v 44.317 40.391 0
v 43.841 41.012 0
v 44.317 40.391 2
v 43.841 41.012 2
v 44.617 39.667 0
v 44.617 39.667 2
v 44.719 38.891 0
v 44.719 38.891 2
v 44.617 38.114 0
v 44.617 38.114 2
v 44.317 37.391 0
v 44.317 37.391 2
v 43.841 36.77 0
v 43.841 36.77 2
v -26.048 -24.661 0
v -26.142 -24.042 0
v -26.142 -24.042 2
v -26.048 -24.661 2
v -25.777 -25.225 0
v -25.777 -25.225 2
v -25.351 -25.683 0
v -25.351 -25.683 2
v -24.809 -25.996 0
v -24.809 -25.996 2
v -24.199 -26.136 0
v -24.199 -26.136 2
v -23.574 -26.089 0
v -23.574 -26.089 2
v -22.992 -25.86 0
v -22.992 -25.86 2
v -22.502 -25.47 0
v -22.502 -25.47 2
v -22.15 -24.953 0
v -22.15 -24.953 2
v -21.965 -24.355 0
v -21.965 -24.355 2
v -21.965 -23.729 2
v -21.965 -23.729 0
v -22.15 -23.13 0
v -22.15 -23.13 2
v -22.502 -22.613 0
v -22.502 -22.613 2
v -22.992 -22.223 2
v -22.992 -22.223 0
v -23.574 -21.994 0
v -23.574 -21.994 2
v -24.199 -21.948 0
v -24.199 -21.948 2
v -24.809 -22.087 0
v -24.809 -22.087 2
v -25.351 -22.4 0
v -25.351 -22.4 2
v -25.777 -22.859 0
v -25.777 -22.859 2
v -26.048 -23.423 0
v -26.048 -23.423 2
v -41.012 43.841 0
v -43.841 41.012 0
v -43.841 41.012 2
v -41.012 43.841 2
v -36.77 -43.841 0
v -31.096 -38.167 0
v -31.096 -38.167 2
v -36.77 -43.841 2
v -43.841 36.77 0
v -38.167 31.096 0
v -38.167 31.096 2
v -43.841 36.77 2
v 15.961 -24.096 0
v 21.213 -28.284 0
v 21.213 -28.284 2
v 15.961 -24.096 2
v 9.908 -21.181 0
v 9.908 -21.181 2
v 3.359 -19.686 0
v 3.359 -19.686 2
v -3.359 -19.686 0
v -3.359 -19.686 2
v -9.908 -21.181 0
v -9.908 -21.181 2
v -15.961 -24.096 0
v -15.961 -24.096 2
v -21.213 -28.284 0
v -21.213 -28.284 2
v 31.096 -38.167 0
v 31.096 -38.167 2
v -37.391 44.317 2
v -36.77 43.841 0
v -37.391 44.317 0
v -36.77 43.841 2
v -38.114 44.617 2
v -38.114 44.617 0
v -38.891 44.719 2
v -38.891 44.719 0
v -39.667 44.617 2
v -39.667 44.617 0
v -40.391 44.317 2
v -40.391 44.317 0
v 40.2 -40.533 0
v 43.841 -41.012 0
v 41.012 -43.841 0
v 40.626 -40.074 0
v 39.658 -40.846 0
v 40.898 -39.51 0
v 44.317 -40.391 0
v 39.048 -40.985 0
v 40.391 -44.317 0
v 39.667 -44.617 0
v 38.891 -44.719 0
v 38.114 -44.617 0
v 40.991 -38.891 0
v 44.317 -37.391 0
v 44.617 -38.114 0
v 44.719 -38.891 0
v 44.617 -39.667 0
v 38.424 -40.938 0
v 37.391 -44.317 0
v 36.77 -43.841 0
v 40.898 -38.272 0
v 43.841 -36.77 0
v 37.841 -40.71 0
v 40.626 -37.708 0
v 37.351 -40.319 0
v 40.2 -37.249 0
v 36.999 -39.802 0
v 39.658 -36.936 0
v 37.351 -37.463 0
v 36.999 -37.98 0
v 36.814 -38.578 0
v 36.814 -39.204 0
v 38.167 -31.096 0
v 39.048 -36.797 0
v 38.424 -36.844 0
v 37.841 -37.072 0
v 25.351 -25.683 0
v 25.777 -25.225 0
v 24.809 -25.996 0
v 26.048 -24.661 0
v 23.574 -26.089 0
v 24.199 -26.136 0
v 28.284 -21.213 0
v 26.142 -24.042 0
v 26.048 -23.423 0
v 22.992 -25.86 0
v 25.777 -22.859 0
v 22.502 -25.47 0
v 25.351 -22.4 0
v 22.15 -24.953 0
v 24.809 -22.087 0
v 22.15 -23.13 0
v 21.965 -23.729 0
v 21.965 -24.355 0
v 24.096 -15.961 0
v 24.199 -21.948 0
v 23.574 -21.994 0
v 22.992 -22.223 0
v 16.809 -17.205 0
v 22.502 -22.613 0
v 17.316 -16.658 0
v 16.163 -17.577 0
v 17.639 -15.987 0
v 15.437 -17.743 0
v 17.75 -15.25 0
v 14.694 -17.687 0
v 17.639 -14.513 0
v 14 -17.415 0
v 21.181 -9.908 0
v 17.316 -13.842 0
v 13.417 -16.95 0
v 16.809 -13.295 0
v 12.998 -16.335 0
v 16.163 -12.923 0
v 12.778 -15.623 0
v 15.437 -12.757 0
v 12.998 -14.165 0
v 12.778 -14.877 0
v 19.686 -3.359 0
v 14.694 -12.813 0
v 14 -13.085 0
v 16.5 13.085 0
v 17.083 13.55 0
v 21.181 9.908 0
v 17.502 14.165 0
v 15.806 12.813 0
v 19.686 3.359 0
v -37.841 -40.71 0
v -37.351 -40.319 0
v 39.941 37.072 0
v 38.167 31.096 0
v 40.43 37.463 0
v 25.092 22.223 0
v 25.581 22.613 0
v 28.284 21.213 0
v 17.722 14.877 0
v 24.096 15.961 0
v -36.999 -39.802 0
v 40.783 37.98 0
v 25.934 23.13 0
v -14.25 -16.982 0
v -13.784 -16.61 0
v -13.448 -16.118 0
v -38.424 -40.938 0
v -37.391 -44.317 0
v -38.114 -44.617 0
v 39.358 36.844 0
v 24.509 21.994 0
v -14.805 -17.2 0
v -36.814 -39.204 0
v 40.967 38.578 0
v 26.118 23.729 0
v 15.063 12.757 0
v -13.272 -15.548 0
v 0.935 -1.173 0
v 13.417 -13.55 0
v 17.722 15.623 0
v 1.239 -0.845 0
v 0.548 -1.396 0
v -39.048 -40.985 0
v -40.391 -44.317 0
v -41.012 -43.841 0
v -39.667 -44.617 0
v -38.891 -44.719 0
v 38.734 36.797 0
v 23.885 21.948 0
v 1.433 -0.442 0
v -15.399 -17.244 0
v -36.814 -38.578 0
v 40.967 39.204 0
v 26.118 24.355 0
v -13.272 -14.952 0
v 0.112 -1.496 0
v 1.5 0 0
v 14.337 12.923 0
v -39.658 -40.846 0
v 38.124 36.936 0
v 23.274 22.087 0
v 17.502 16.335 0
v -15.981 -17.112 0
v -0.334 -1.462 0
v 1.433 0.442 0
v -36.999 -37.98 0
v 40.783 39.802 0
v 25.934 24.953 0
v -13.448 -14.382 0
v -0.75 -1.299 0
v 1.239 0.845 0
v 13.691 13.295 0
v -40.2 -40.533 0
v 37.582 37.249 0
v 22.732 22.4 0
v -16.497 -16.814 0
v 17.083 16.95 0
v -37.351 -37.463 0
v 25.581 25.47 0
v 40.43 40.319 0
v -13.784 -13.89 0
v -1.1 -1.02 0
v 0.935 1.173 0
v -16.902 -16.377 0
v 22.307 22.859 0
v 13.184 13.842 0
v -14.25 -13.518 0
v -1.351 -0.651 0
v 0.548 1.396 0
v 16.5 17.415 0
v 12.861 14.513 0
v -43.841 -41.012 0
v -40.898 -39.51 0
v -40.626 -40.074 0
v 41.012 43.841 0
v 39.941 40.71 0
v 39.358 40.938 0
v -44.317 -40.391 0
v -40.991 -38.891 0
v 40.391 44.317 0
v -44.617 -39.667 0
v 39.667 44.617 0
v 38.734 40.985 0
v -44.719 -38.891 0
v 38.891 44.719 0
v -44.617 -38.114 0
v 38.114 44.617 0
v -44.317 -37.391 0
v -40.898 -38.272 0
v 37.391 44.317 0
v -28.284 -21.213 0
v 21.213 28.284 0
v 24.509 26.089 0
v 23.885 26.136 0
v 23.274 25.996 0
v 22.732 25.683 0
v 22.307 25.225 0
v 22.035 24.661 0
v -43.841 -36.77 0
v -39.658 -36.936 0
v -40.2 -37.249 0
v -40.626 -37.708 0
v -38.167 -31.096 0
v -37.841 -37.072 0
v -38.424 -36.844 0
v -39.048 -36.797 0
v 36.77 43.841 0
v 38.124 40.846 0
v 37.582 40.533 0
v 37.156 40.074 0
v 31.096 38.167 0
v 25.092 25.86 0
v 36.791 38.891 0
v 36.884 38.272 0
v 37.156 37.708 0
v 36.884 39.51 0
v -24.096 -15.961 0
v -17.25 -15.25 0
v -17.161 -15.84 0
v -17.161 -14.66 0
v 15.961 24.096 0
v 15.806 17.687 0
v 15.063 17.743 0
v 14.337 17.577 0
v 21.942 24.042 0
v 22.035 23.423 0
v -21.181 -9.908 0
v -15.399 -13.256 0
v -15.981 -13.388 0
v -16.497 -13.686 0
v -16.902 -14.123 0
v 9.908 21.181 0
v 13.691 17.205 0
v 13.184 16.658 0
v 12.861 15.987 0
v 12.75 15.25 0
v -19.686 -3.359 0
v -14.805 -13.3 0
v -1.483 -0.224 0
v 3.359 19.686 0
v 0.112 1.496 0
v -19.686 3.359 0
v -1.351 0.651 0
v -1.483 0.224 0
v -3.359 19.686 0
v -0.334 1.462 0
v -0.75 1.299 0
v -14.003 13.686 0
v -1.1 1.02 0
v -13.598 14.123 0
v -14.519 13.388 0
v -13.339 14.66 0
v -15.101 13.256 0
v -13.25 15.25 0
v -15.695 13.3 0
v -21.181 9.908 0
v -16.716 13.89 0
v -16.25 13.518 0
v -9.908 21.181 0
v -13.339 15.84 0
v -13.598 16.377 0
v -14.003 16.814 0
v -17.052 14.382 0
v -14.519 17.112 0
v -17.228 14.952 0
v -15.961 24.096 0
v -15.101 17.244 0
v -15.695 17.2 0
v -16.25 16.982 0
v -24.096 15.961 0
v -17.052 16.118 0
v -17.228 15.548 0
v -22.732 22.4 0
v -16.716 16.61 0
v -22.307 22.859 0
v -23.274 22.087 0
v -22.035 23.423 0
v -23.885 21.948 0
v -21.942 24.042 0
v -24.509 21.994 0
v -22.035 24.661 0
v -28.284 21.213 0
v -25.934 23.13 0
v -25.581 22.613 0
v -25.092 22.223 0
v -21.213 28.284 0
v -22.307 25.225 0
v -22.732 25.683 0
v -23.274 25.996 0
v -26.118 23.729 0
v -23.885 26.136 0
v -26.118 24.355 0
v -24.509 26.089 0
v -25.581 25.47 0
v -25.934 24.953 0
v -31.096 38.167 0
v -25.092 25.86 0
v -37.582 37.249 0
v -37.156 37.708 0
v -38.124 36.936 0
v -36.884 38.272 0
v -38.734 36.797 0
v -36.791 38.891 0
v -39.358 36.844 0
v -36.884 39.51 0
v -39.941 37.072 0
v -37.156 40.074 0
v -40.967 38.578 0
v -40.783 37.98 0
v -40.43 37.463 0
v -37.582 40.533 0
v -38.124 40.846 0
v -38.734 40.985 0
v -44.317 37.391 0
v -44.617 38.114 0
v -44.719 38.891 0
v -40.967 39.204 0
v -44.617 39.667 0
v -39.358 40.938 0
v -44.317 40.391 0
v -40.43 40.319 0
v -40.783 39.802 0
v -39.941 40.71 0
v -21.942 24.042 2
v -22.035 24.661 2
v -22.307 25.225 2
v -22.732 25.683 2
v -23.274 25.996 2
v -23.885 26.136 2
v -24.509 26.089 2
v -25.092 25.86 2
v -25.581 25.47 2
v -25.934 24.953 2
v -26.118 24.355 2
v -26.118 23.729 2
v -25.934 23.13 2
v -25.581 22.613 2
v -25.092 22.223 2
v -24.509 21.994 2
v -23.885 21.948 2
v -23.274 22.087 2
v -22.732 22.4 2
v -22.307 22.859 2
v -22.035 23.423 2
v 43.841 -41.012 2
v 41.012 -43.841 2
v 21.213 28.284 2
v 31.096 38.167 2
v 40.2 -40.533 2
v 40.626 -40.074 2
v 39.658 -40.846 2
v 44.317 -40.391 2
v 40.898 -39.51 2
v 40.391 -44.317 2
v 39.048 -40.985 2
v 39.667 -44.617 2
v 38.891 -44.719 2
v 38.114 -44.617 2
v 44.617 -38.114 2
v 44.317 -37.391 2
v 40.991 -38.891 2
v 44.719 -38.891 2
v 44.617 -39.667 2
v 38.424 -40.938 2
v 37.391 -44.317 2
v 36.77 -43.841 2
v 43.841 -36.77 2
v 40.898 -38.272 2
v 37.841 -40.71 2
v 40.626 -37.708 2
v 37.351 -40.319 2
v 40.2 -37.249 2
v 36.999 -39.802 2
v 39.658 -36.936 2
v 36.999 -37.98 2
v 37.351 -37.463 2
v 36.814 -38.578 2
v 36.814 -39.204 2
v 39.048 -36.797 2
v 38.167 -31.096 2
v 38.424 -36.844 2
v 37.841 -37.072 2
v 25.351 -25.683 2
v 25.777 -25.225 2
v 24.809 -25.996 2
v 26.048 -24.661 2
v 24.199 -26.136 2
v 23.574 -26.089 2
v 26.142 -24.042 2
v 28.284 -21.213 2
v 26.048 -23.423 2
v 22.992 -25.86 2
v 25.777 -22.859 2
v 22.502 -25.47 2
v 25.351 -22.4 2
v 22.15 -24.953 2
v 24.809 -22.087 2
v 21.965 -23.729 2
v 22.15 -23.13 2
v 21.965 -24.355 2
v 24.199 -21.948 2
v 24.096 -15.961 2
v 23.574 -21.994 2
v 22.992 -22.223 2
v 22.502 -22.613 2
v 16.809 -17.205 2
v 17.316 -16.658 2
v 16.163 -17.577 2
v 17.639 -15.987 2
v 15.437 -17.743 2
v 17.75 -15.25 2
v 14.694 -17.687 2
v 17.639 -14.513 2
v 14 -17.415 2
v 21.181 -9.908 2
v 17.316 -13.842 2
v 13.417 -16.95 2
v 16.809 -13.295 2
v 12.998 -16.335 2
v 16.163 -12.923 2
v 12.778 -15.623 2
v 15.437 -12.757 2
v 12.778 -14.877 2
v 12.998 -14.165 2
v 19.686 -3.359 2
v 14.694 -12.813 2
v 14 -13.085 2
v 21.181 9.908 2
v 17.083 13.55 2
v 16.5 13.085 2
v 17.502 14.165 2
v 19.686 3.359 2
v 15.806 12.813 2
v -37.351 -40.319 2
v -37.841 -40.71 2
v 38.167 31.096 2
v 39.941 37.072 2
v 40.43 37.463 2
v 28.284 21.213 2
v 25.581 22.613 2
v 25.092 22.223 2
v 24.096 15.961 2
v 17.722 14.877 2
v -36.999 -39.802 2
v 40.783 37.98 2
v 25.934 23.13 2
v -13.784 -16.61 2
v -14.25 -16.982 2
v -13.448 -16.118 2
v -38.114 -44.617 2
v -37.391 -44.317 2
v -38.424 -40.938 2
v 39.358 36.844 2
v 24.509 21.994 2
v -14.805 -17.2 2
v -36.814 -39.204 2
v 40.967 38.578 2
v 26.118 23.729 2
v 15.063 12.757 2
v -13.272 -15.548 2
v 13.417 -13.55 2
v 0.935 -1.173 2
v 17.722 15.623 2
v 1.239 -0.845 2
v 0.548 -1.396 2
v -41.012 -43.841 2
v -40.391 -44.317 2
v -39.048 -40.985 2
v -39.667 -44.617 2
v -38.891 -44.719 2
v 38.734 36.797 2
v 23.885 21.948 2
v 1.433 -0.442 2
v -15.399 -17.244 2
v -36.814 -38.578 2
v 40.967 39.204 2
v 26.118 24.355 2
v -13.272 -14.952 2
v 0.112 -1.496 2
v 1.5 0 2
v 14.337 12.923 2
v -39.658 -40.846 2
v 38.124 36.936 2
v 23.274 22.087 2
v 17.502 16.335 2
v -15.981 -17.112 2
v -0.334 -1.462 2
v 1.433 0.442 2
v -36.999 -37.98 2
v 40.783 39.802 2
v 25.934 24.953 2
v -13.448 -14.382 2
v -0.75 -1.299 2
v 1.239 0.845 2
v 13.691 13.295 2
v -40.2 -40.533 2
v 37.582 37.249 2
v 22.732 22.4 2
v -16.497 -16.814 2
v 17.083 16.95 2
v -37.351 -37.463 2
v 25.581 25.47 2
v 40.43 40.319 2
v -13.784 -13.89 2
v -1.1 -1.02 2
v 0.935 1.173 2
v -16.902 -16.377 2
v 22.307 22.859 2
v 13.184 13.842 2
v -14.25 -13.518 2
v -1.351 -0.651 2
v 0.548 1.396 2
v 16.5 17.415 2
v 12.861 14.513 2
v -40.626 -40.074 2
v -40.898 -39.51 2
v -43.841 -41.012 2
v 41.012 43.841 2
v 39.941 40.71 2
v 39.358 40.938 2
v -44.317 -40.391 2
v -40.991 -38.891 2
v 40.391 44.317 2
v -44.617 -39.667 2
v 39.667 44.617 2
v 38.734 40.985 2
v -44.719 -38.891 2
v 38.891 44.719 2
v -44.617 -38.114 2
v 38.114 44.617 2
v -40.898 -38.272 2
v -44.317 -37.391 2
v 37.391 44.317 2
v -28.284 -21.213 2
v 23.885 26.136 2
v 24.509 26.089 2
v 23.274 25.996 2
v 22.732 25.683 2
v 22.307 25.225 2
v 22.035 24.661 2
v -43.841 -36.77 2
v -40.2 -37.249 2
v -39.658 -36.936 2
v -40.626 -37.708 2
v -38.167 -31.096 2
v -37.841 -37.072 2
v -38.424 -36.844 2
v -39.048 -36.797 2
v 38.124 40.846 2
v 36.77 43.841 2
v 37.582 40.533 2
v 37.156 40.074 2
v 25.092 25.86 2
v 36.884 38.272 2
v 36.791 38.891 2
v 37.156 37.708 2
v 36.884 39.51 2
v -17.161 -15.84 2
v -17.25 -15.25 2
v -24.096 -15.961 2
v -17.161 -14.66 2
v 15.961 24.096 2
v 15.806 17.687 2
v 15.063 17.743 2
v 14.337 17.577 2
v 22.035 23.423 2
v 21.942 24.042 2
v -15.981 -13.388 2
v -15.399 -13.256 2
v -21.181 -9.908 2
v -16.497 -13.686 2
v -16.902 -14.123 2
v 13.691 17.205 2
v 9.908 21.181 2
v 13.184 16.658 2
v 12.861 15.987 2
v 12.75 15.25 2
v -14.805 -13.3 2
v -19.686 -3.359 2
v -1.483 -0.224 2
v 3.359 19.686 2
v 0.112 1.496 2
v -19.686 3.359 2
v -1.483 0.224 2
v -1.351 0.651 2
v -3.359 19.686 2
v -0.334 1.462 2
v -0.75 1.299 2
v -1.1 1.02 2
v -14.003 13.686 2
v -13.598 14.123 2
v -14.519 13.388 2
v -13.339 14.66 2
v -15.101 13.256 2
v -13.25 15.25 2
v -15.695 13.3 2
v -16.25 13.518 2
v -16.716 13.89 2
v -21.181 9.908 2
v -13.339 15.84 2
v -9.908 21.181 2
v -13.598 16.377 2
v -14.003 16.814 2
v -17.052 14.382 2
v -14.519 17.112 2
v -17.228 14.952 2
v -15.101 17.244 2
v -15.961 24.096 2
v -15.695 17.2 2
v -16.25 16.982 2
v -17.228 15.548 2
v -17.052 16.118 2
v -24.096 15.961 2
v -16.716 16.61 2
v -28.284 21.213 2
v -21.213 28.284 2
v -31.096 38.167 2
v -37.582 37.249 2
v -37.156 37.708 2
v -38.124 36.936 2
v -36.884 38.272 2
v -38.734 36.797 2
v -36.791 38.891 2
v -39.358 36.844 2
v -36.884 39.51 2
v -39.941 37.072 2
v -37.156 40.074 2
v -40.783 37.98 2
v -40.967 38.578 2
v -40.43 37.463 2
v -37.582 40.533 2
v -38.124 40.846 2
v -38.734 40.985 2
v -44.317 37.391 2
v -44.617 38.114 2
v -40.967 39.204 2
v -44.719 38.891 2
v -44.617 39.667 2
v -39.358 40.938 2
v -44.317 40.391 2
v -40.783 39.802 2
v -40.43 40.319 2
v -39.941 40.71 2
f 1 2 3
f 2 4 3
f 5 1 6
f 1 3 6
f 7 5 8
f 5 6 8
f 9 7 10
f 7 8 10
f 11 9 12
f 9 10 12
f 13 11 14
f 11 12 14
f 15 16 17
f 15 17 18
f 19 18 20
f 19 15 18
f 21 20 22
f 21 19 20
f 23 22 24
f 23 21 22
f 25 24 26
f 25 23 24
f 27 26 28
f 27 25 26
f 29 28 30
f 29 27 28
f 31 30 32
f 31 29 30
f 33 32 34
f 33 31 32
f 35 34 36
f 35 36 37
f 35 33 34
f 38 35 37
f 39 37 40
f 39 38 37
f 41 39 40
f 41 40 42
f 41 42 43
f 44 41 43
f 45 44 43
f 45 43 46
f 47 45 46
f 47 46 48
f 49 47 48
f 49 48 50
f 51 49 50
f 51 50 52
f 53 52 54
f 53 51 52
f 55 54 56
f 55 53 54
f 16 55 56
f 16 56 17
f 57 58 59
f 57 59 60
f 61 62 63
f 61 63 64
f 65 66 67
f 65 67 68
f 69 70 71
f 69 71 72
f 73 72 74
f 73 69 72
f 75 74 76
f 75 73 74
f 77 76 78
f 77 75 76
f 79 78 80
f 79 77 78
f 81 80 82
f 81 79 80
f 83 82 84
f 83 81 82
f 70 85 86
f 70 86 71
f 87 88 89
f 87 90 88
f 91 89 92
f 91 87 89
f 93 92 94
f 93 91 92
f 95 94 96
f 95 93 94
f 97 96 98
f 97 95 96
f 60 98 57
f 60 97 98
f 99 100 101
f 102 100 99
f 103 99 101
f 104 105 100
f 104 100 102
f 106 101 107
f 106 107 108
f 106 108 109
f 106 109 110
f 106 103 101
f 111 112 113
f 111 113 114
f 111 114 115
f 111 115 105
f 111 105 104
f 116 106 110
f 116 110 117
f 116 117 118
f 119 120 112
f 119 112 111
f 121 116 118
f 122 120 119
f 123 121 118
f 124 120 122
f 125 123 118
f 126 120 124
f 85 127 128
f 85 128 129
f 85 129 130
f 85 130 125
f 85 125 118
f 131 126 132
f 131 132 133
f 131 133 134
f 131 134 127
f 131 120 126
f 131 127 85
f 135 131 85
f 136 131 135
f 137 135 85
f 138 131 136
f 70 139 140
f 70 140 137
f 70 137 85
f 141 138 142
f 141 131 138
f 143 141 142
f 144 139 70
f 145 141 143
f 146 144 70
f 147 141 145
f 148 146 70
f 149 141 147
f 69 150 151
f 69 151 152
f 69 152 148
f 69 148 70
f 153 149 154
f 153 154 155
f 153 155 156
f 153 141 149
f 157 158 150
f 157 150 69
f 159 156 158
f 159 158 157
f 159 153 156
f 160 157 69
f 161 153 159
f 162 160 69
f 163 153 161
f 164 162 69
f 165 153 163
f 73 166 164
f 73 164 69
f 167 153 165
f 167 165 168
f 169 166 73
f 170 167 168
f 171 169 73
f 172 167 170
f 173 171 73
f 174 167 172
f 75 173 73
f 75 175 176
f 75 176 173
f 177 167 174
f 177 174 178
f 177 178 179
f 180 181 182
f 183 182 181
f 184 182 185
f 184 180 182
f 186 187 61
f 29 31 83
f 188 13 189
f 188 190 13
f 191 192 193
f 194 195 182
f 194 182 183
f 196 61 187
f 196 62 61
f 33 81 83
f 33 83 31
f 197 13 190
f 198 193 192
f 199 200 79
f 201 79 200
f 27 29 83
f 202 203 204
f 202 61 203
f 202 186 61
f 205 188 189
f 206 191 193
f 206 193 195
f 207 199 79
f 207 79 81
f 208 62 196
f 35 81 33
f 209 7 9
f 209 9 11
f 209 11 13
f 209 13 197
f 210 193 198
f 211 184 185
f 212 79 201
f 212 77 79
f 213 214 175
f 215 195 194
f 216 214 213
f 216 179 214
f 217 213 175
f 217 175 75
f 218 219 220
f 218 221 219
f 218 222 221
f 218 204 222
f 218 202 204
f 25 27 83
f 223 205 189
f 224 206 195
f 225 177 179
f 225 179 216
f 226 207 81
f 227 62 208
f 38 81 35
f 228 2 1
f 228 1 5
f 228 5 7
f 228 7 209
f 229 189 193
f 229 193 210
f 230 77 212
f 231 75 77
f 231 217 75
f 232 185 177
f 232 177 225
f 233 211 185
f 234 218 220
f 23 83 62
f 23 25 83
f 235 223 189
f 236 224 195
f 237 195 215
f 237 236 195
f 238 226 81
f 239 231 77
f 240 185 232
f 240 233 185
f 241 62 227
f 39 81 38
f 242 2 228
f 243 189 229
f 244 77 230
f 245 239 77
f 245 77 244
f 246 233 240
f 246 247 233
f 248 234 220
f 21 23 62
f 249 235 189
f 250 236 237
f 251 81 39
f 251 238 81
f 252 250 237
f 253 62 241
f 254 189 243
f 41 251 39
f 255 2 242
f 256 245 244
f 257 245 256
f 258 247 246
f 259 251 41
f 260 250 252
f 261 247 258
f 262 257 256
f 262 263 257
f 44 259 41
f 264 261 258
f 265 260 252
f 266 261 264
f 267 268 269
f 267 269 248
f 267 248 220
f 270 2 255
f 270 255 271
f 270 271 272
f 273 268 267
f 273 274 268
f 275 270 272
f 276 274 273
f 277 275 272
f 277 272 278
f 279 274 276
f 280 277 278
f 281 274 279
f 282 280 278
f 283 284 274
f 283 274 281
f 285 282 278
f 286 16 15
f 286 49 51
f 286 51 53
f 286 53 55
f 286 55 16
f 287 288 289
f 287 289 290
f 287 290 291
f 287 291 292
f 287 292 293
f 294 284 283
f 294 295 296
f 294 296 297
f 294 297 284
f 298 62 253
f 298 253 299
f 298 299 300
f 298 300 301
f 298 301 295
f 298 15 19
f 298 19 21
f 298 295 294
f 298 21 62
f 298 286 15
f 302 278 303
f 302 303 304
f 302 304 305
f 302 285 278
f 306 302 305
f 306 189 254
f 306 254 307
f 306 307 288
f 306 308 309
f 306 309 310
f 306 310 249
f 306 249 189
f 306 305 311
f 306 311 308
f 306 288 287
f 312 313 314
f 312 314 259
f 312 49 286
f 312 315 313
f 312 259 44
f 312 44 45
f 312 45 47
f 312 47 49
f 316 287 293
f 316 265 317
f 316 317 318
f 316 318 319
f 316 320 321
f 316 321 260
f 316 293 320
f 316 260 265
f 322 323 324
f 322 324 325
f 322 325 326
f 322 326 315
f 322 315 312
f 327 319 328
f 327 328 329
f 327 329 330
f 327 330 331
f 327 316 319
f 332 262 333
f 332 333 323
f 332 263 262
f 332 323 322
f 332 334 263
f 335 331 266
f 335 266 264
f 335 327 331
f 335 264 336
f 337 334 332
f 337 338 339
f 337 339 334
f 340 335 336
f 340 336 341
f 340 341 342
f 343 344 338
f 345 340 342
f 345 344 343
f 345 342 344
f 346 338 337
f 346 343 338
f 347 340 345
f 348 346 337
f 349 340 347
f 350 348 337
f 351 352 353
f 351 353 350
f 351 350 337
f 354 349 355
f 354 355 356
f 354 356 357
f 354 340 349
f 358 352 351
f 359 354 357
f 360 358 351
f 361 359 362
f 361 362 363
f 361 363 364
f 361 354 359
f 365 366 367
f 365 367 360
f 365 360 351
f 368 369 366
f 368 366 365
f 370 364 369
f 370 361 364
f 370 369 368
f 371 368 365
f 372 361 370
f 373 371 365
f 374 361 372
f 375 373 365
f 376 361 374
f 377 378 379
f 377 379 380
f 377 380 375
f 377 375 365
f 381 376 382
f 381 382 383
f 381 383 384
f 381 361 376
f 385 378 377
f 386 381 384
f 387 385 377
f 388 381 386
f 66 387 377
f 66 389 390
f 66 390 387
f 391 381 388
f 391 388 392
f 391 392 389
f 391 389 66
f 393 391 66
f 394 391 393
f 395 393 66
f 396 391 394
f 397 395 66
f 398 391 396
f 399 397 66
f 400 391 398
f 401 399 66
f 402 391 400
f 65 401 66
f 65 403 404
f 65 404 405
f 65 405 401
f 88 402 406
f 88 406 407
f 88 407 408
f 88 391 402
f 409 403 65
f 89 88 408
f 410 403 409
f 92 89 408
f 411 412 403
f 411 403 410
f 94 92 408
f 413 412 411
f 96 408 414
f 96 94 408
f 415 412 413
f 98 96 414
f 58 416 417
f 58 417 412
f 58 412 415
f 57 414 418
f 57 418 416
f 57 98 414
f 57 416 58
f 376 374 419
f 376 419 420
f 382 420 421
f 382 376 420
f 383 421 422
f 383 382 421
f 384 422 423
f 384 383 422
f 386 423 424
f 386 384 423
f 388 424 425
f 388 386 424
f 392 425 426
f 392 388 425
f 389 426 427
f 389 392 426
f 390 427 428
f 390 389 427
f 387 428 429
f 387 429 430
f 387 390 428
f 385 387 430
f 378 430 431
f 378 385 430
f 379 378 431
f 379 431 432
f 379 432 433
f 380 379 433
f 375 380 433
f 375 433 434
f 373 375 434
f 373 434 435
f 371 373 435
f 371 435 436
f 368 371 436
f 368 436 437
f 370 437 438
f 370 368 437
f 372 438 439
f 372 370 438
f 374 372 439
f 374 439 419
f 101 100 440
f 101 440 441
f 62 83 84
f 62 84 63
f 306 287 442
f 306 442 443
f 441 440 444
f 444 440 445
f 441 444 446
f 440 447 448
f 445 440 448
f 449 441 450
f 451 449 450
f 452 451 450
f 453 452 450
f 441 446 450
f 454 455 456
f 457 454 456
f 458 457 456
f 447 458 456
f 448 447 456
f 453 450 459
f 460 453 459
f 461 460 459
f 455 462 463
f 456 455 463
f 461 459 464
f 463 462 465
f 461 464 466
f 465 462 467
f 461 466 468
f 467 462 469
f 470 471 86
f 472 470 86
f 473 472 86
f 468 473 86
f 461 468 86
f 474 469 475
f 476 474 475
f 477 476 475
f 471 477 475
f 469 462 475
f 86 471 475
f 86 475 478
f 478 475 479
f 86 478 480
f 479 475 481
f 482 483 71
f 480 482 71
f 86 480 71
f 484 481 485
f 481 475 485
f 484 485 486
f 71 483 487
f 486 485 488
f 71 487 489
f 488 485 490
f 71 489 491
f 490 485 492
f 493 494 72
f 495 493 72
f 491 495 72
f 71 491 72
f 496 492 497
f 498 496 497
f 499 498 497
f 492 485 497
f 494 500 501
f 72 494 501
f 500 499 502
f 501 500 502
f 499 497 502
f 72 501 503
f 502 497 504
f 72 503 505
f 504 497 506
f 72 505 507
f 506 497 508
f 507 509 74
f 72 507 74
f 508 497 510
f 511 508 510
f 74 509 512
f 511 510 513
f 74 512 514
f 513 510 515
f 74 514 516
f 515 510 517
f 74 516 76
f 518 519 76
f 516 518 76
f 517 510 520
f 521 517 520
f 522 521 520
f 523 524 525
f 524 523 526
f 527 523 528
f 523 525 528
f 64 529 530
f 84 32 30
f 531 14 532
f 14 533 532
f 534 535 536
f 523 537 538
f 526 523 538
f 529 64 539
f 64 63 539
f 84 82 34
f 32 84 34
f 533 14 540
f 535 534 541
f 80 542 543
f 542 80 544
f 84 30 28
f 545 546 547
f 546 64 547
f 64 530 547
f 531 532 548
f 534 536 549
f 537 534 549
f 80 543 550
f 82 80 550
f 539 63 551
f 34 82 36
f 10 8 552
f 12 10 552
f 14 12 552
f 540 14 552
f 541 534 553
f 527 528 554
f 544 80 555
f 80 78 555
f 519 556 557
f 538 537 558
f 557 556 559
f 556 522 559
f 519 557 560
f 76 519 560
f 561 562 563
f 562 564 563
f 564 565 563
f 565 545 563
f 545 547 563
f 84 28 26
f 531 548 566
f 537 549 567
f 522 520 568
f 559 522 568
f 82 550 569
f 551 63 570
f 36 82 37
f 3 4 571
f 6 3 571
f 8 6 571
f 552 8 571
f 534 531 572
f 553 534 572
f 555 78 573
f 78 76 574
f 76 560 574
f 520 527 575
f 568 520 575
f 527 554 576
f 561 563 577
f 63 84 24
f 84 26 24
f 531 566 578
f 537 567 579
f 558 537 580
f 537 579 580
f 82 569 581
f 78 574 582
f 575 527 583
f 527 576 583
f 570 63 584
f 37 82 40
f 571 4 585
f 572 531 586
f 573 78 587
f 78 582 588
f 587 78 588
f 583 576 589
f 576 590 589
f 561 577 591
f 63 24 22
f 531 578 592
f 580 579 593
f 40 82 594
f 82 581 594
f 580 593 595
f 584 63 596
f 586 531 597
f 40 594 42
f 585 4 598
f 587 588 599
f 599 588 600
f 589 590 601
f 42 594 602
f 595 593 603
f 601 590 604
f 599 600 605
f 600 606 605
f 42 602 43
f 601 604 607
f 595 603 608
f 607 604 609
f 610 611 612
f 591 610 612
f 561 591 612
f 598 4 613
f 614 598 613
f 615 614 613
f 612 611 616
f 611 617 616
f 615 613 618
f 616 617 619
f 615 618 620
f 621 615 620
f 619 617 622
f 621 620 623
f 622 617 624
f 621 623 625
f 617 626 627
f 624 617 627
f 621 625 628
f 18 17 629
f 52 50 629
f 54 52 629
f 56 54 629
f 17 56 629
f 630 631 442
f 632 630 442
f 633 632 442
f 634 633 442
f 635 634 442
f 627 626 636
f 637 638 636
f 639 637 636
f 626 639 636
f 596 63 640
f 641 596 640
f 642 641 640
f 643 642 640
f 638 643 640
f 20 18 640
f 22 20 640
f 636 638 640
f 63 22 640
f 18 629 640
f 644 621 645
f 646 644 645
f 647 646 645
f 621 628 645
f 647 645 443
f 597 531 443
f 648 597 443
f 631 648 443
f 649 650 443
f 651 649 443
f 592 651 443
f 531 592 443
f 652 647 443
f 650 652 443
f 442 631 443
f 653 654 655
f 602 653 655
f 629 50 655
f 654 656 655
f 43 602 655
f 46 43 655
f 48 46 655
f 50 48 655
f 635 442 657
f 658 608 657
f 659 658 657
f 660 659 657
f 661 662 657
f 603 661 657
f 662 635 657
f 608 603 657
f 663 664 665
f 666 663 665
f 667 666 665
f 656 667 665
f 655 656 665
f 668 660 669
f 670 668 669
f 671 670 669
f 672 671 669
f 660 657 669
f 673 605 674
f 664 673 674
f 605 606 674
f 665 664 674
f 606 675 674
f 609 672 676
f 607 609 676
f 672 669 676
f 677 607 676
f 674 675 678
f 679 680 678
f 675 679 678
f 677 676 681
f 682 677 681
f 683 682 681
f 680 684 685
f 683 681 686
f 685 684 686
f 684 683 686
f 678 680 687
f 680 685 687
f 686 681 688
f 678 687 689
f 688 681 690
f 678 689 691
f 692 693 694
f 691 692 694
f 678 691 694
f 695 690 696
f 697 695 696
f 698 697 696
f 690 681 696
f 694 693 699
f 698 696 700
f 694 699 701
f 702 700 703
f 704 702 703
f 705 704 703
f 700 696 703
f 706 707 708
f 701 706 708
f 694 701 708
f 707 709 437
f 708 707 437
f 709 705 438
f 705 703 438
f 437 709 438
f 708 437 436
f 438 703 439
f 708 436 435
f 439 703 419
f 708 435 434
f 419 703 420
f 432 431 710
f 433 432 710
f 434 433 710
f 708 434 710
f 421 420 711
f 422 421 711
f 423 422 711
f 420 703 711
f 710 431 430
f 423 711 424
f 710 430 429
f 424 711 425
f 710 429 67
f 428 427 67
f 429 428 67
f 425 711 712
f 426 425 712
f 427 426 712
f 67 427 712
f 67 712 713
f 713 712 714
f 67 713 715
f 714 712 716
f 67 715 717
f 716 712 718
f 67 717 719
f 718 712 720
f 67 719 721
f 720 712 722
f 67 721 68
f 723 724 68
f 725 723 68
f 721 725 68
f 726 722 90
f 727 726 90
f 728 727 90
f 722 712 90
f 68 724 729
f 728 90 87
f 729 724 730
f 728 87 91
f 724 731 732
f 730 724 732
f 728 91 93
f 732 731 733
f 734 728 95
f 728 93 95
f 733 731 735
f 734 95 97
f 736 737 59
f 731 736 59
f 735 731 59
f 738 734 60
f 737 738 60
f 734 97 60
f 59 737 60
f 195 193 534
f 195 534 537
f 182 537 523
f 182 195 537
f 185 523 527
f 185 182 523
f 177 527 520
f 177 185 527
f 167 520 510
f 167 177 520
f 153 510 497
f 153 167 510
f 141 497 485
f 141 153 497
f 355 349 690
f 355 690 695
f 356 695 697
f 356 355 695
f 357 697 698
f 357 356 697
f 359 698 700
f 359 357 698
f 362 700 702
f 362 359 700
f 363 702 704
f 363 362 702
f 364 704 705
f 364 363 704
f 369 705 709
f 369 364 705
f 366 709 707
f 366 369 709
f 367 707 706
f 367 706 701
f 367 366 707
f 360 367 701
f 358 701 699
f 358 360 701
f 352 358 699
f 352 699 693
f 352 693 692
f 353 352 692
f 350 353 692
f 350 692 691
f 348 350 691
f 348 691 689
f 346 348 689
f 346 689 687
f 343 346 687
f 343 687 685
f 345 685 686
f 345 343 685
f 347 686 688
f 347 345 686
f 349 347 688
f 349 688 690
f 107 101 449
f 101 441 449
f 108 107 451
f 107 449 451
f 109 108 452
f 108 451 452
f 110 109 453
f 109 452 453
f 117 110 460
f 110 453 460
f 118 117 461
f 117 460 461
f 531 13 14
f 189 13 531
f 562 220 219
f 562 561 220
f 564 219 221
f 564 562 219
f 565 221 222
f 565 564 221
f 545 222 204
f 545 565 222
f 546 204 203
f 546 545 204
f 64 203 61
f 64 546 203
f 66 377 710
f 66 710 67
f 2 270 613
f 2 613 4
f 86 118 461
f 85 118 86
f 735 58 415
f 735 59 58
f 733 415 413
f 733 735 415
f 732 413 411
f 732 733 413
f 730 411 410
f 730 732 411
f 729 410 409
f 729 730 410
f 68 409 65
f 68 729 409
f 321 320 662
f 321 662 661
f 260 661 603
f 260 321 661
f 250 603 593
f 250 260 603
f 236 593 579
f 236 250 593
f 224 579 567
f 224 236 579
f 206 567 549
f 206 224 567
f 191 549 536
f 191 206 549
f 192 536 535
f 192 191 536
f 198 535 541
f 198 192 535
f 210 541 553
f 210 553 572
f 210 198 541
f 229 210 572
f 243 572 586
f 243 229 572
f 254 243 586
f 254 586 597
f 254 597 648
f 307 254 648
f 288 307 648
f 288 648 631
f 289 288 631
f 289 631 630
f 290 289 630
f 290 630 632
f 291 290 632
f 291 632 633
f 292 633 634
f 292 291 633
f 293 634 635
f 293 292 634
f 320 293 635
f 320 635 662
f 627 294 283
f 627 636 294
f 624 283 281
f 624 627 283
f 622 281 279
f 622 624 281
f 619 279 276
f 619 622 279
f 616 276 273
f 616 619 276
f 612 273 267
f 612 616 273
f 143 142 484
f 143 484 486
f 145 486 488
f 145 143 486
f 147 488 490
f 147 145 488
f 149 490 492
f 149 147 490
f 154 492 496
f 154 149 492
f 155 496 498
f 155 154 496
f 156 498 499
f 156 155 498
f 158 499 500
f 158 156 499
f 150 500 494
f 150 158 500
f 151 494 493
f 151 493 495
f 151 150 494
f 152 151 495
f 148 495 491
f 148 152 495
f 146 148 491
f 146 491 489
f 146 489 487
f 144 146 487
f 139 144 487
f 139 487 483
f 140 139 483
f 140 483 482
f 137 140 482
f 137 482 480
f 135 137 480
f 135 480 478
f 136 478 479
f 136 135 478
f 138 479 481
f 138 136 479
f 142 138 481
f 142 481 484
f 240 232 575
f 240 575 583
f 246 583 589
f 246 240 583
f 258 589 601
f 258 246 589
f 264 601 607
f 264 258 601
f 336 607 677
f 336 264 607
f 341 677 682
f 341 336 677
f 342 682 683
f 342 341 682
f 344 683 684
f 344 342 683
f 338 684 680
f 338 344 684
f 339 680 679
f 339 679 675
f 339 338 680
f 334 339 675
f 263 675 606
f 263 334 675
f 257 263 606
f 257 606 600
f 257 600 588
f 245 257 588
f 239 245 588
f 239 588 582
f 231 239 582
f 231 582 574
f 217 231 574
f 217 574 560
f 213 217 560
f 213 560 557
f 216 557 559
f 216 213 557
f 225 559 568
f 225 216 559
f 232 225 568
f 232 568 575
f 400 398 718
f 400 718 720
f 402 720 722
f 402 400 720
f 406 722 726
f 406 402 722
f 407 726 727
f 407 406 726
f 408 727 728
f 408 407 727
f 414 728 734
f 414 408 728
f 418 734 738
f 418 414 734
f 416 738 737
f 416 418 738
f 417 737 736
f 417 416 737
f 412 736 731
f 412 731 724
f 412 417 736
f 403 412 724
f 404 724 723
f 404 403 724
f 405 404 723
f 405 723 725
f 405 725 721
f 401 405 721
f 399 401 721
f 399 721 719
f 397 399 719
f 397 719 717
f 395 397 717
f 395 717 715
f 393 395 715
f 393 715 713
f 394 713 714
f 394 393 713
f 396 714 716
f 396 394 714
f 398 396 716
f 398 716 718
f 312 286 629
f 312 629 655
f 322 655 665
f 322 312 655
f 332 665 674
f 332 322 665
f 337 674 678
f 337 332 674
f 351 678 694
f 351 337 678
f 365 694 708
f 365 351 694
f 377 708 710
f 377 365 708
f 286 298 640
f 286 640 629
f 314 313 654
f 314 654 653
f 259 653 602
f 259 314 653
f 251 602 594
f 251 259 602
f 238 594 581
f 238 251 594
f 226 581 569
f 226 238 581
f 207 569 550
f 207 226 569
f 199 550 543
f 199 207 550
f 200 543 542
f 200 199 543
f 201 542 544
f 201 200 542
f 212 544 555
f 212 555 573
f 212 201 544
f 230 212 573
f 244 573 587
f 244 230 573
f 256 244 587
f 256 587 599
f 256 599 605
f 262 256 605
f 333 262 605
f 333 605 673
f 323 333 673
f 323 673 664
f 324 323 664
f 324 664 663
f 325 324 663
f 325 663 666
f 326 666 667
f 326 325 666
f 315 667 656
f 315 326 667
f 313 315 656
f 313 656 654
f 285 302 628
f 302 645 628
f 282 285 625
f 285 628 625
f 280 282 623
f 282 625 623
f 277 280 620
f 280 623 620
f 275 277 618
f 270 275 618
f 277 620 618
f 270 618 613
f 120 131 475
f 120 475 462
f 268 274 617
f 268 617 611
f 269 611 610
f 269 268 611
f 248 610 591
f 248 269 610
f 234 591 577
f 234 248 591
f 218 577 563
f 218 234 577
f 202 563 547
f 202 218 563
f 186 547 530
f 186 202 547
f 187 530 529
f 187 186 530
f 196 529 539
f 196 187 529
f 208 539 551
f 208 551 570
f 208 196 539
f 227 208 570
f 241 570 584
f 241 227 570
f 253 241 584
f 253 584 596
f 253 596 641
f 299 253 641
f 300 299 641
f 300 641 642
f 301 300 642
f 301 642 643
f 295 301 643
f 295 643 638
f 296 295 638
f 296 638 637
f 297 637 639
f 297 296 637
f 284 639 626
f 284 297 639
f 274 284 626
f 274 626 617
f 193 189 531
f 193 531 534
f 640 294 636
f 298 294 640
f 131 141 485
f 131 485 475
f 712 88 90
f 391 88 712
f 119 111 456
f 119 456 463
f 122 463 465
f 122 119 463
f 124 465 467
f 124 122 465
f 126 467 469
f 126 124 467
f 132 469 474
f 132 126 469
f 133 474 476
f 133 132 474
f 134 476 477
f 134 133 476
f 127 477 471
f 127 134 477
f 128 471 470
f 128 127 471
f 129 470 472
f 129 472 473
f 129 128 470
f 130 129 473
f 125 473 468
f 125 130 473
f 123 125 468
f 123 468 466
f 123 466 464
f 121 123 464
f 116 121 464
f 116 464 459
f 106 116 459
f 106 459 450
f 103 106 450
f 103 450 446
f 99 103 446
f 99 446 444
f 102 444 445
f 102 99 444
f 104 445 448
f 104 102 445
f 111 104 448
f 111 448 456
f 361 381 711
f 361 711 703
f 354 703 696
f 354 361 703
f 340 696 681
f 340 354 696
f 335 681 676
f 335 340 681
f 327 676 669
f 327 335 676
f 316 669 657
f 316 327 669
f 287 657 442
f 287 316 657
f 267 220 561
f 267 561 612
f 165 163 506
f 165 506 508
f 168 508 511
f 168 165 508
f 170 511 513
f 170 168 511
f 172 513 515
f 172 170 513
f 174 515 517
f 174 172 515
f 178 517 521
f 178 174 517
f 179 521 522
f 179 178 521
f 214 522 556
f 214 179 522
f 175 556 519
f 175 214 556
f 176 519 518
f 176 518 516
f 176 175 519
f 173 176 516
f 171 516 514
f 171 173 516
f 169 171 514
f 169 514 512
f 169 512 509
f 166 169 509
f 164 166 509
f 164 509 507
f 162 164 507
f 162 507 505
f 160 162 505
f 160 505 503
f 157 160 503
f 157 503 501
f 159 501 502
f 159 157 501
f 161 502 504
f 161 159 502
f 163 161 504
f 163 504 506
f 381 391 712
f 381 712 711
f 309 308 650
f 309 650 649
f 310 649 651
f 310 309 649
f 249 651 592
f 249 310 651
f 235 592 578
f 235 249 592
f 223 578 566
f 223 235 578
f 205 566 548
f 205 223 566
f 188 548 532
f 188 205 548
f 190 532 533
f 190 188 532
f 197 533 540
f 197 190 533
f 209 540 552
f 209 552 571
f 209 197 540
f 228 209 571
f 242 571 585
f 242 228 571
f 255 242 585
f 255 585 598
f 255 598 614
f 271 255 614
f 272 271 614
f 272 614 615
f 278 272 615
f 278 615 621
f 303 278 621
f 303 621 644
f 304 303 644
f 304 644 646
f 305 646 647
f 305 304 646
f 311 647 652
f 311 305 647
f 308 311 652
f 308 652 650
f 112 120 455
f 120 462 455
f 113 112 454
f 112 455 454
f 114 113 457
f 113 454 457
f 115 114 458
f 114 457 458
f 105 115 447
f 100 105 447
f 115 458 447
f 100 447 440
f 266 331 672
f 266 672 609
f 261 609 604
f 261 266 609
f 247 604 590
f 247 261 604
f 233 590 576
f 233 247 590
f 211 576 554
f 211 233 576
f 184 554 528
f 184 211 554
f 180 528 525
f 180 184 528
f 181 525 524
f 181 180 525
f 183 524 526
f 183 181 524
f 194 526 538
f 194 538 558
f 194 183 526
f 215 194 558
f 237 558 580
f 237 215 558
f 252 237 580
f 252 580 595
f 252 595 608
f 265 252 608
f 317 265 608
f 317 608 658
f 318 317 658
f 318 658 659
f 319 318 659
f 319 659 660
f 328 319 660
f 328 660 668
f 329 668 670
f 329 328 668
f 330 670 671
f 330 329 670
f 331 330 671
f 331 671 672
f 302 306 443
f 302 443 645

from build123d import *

# Parameters (mm, degrees)
CROQUIS1_R              = 2
CROQUIS1_R_2            = 2.1
CROQUIS1_R_3            = 2.5
CROQUIS1_R_4            = 1.5
SALIENTE_EXTRUIR1_DEPTH = 2
REDONDEO3_R             = 3


with BuildPart() as part:
    # Croquis1 → Saliente-Extruir1 (new body)
    with BuildSketch(Plane.XY):
        with BuildLine():
            Line((-31.096194078, 38.16726189), (-21.213203436, 28.284271247))
            ThreePointArc((-21.213203436, 28.284271247), (0, 19.497474683), (21.213203436, 28.284271247))
            Line((21.213203436, 28.284271247), (31.096194078, 38.16726189))
            Line((31.096194078, 38.16726189), (38.890872965, 45.961940777))
            Line((38.890872965, 45.961940777), (42.426406871, 42.426406871))
            Line((42.426406871, 42.426406871), (45.961940777, 38.890872965))
            Line((45.961940777, 38.890872965), (38.16726189, 31.096194078))
            Line((38.16726189, 31.096194078), (28.284271247, 21.213203436))
            ThreePointArc((28.284271247, 21.213203436), (19.497474683, 0), (28.284271247, -21.213203436))
            Line((28.284271247, -21.213203436), (38.16726189, -31.096194078))
            Line((38.16726189, -31.096194078), (45.961940777, -38.890872965))
            Line((45.961940777, -38.890872965), (42.426406871, -42.426406871))
            Line((42.426406871, -42.426406871), (38.890872965, -45.961940777))
            Line((38.890872965, -45.961940777), (31.096194078, -38.16726189))
            Line((31.096194078, -38.16726189), (21.213203436, -28.284271247))
            ThreePointArc((21.213203436, -28.284271247), (0, -19.497474683), (-21.213203436, -28.284271247))
            Line((-21.213203436, -28.284271247), (-31.096194078, -38.16726189))
            Line((-31.096194078, -38.16726189), (-38.890872965, -45.961940777))
            Line((-38.890872965, -45.961940777), (-42.426406871, -42.426406871))
            Line((-42.426406871, -42.426406871), (-45.961940777, -38.890872965))
            Line((-45.961940777, -38.890872965), (-38.16726189, -31.096194078))
            Line((-38.16726189, -31.096194078), (-28.284271247, -21.213203436))
            ThreePointArc((-28.284271247, -21.213203436), (-19.497474683, 0), (-28.284271247, 21.213203436))
            Line((-28.284271247, 21.213203436), (-38.16726189, 31.096194078))
            Line((-38.16726189, 31.096194078), (-45.961940777, 38.890872965))
            Line((-45.961940777, 38.890872965), (-42.426406871, 42.426406871))
            Line((-42.426406871, 42.426406871), (-38.890872965, 45.961940777))
            Line((-38.890872965, 45.961940777), (-31.096194078, 38.16726189))
        make_face()
        with Locations((-15.25, 15.25)):
            Circle(CROQUIS1_R, mode=Mode.SUBTRACT)
        with Locations((-24.04163056, 24.04163056)):
            Circle(CROQUIS1_R_2, mode=Mode.SUBTRACT)
        with Locations((-38.890872965, 38.890872965)):
            Circle(CROQUIS1_R_2, mode=Mode.SUBTRACT)
        with Locations(Location((38.890872965, 38.890872965, 0), (0, 0, 180))):
            Circle(CROQUIS1_R_2, mode=Mode.SUBTRACT)
        with Locations(Location((24.04163056, 24.04163056, 0), (0, 0, 180))):
            Circle(CROQUIS1_R_2, mode=Mode.SUBTRACT)
        with Locations(Location((15.25, 15.25, 0), (0, 0, 180))):
            Circle(CROQUIS1_R_3, mode=Mode.SUBTRACT)
        with Locations((15.25, -15.25)):
            Circle(CROQUIS1_R_3, mode=Mode.SUBTRACT)
        with Locations((24.04163056, -24.04163056)):
            Circle(CROQUIS1_R_2, mode=Mode.SUBTRACT)
        with Locations((38.890872965, -38.890872965)):
            Circle(CROQUIS1_R_2, mode=Mode.SUBTRACT)
        with Locations(Location((-15.25, -15.25, 0), (0, 0, 180))):
            Circle(CROQUIS1_R, mode=Mode.SUBTRACT)
        with Locations(Location((-24.04163056, -24.04163056, 0), (0, 0, 180))):
            Circle(CROQUIS1_R_2, mode=Mode.SUBTRACT)
        with Locations(Location((-38.890872965, -38.890872965, 0), (0, 0, 180))):
            Circle(CROQUIS1_R_2, mode=Mode.SUBTRACT)
        Circle(CROQUIS1_R_4, mode=Mode.SUBTRACT)
    extrude(amount=SALIENTE_EXTRUIR1_DEPTH)

    # Redondeo3
    redondeo3_edges = [part.edges().sort_by_distance(p)[0] for p in [
        (-38.890872965, 45.961940777, 1),
        (38.890872965, 45.961940777, 1),
        (45.961940777, 38.890872965, 1),
        (45.961940777, -38.890872965, 1),
        (38.890872965, -45.961940777, 1),
        (-38.890872965, -45.961940777, 1),
        (-45.961940777, -38.890872965, 1),
        (-45.961940777, 38.890872965, 1),
    ]]
    fillet(redondeo3_edges, radius=REDONDEO3_R)


solid = part.part
